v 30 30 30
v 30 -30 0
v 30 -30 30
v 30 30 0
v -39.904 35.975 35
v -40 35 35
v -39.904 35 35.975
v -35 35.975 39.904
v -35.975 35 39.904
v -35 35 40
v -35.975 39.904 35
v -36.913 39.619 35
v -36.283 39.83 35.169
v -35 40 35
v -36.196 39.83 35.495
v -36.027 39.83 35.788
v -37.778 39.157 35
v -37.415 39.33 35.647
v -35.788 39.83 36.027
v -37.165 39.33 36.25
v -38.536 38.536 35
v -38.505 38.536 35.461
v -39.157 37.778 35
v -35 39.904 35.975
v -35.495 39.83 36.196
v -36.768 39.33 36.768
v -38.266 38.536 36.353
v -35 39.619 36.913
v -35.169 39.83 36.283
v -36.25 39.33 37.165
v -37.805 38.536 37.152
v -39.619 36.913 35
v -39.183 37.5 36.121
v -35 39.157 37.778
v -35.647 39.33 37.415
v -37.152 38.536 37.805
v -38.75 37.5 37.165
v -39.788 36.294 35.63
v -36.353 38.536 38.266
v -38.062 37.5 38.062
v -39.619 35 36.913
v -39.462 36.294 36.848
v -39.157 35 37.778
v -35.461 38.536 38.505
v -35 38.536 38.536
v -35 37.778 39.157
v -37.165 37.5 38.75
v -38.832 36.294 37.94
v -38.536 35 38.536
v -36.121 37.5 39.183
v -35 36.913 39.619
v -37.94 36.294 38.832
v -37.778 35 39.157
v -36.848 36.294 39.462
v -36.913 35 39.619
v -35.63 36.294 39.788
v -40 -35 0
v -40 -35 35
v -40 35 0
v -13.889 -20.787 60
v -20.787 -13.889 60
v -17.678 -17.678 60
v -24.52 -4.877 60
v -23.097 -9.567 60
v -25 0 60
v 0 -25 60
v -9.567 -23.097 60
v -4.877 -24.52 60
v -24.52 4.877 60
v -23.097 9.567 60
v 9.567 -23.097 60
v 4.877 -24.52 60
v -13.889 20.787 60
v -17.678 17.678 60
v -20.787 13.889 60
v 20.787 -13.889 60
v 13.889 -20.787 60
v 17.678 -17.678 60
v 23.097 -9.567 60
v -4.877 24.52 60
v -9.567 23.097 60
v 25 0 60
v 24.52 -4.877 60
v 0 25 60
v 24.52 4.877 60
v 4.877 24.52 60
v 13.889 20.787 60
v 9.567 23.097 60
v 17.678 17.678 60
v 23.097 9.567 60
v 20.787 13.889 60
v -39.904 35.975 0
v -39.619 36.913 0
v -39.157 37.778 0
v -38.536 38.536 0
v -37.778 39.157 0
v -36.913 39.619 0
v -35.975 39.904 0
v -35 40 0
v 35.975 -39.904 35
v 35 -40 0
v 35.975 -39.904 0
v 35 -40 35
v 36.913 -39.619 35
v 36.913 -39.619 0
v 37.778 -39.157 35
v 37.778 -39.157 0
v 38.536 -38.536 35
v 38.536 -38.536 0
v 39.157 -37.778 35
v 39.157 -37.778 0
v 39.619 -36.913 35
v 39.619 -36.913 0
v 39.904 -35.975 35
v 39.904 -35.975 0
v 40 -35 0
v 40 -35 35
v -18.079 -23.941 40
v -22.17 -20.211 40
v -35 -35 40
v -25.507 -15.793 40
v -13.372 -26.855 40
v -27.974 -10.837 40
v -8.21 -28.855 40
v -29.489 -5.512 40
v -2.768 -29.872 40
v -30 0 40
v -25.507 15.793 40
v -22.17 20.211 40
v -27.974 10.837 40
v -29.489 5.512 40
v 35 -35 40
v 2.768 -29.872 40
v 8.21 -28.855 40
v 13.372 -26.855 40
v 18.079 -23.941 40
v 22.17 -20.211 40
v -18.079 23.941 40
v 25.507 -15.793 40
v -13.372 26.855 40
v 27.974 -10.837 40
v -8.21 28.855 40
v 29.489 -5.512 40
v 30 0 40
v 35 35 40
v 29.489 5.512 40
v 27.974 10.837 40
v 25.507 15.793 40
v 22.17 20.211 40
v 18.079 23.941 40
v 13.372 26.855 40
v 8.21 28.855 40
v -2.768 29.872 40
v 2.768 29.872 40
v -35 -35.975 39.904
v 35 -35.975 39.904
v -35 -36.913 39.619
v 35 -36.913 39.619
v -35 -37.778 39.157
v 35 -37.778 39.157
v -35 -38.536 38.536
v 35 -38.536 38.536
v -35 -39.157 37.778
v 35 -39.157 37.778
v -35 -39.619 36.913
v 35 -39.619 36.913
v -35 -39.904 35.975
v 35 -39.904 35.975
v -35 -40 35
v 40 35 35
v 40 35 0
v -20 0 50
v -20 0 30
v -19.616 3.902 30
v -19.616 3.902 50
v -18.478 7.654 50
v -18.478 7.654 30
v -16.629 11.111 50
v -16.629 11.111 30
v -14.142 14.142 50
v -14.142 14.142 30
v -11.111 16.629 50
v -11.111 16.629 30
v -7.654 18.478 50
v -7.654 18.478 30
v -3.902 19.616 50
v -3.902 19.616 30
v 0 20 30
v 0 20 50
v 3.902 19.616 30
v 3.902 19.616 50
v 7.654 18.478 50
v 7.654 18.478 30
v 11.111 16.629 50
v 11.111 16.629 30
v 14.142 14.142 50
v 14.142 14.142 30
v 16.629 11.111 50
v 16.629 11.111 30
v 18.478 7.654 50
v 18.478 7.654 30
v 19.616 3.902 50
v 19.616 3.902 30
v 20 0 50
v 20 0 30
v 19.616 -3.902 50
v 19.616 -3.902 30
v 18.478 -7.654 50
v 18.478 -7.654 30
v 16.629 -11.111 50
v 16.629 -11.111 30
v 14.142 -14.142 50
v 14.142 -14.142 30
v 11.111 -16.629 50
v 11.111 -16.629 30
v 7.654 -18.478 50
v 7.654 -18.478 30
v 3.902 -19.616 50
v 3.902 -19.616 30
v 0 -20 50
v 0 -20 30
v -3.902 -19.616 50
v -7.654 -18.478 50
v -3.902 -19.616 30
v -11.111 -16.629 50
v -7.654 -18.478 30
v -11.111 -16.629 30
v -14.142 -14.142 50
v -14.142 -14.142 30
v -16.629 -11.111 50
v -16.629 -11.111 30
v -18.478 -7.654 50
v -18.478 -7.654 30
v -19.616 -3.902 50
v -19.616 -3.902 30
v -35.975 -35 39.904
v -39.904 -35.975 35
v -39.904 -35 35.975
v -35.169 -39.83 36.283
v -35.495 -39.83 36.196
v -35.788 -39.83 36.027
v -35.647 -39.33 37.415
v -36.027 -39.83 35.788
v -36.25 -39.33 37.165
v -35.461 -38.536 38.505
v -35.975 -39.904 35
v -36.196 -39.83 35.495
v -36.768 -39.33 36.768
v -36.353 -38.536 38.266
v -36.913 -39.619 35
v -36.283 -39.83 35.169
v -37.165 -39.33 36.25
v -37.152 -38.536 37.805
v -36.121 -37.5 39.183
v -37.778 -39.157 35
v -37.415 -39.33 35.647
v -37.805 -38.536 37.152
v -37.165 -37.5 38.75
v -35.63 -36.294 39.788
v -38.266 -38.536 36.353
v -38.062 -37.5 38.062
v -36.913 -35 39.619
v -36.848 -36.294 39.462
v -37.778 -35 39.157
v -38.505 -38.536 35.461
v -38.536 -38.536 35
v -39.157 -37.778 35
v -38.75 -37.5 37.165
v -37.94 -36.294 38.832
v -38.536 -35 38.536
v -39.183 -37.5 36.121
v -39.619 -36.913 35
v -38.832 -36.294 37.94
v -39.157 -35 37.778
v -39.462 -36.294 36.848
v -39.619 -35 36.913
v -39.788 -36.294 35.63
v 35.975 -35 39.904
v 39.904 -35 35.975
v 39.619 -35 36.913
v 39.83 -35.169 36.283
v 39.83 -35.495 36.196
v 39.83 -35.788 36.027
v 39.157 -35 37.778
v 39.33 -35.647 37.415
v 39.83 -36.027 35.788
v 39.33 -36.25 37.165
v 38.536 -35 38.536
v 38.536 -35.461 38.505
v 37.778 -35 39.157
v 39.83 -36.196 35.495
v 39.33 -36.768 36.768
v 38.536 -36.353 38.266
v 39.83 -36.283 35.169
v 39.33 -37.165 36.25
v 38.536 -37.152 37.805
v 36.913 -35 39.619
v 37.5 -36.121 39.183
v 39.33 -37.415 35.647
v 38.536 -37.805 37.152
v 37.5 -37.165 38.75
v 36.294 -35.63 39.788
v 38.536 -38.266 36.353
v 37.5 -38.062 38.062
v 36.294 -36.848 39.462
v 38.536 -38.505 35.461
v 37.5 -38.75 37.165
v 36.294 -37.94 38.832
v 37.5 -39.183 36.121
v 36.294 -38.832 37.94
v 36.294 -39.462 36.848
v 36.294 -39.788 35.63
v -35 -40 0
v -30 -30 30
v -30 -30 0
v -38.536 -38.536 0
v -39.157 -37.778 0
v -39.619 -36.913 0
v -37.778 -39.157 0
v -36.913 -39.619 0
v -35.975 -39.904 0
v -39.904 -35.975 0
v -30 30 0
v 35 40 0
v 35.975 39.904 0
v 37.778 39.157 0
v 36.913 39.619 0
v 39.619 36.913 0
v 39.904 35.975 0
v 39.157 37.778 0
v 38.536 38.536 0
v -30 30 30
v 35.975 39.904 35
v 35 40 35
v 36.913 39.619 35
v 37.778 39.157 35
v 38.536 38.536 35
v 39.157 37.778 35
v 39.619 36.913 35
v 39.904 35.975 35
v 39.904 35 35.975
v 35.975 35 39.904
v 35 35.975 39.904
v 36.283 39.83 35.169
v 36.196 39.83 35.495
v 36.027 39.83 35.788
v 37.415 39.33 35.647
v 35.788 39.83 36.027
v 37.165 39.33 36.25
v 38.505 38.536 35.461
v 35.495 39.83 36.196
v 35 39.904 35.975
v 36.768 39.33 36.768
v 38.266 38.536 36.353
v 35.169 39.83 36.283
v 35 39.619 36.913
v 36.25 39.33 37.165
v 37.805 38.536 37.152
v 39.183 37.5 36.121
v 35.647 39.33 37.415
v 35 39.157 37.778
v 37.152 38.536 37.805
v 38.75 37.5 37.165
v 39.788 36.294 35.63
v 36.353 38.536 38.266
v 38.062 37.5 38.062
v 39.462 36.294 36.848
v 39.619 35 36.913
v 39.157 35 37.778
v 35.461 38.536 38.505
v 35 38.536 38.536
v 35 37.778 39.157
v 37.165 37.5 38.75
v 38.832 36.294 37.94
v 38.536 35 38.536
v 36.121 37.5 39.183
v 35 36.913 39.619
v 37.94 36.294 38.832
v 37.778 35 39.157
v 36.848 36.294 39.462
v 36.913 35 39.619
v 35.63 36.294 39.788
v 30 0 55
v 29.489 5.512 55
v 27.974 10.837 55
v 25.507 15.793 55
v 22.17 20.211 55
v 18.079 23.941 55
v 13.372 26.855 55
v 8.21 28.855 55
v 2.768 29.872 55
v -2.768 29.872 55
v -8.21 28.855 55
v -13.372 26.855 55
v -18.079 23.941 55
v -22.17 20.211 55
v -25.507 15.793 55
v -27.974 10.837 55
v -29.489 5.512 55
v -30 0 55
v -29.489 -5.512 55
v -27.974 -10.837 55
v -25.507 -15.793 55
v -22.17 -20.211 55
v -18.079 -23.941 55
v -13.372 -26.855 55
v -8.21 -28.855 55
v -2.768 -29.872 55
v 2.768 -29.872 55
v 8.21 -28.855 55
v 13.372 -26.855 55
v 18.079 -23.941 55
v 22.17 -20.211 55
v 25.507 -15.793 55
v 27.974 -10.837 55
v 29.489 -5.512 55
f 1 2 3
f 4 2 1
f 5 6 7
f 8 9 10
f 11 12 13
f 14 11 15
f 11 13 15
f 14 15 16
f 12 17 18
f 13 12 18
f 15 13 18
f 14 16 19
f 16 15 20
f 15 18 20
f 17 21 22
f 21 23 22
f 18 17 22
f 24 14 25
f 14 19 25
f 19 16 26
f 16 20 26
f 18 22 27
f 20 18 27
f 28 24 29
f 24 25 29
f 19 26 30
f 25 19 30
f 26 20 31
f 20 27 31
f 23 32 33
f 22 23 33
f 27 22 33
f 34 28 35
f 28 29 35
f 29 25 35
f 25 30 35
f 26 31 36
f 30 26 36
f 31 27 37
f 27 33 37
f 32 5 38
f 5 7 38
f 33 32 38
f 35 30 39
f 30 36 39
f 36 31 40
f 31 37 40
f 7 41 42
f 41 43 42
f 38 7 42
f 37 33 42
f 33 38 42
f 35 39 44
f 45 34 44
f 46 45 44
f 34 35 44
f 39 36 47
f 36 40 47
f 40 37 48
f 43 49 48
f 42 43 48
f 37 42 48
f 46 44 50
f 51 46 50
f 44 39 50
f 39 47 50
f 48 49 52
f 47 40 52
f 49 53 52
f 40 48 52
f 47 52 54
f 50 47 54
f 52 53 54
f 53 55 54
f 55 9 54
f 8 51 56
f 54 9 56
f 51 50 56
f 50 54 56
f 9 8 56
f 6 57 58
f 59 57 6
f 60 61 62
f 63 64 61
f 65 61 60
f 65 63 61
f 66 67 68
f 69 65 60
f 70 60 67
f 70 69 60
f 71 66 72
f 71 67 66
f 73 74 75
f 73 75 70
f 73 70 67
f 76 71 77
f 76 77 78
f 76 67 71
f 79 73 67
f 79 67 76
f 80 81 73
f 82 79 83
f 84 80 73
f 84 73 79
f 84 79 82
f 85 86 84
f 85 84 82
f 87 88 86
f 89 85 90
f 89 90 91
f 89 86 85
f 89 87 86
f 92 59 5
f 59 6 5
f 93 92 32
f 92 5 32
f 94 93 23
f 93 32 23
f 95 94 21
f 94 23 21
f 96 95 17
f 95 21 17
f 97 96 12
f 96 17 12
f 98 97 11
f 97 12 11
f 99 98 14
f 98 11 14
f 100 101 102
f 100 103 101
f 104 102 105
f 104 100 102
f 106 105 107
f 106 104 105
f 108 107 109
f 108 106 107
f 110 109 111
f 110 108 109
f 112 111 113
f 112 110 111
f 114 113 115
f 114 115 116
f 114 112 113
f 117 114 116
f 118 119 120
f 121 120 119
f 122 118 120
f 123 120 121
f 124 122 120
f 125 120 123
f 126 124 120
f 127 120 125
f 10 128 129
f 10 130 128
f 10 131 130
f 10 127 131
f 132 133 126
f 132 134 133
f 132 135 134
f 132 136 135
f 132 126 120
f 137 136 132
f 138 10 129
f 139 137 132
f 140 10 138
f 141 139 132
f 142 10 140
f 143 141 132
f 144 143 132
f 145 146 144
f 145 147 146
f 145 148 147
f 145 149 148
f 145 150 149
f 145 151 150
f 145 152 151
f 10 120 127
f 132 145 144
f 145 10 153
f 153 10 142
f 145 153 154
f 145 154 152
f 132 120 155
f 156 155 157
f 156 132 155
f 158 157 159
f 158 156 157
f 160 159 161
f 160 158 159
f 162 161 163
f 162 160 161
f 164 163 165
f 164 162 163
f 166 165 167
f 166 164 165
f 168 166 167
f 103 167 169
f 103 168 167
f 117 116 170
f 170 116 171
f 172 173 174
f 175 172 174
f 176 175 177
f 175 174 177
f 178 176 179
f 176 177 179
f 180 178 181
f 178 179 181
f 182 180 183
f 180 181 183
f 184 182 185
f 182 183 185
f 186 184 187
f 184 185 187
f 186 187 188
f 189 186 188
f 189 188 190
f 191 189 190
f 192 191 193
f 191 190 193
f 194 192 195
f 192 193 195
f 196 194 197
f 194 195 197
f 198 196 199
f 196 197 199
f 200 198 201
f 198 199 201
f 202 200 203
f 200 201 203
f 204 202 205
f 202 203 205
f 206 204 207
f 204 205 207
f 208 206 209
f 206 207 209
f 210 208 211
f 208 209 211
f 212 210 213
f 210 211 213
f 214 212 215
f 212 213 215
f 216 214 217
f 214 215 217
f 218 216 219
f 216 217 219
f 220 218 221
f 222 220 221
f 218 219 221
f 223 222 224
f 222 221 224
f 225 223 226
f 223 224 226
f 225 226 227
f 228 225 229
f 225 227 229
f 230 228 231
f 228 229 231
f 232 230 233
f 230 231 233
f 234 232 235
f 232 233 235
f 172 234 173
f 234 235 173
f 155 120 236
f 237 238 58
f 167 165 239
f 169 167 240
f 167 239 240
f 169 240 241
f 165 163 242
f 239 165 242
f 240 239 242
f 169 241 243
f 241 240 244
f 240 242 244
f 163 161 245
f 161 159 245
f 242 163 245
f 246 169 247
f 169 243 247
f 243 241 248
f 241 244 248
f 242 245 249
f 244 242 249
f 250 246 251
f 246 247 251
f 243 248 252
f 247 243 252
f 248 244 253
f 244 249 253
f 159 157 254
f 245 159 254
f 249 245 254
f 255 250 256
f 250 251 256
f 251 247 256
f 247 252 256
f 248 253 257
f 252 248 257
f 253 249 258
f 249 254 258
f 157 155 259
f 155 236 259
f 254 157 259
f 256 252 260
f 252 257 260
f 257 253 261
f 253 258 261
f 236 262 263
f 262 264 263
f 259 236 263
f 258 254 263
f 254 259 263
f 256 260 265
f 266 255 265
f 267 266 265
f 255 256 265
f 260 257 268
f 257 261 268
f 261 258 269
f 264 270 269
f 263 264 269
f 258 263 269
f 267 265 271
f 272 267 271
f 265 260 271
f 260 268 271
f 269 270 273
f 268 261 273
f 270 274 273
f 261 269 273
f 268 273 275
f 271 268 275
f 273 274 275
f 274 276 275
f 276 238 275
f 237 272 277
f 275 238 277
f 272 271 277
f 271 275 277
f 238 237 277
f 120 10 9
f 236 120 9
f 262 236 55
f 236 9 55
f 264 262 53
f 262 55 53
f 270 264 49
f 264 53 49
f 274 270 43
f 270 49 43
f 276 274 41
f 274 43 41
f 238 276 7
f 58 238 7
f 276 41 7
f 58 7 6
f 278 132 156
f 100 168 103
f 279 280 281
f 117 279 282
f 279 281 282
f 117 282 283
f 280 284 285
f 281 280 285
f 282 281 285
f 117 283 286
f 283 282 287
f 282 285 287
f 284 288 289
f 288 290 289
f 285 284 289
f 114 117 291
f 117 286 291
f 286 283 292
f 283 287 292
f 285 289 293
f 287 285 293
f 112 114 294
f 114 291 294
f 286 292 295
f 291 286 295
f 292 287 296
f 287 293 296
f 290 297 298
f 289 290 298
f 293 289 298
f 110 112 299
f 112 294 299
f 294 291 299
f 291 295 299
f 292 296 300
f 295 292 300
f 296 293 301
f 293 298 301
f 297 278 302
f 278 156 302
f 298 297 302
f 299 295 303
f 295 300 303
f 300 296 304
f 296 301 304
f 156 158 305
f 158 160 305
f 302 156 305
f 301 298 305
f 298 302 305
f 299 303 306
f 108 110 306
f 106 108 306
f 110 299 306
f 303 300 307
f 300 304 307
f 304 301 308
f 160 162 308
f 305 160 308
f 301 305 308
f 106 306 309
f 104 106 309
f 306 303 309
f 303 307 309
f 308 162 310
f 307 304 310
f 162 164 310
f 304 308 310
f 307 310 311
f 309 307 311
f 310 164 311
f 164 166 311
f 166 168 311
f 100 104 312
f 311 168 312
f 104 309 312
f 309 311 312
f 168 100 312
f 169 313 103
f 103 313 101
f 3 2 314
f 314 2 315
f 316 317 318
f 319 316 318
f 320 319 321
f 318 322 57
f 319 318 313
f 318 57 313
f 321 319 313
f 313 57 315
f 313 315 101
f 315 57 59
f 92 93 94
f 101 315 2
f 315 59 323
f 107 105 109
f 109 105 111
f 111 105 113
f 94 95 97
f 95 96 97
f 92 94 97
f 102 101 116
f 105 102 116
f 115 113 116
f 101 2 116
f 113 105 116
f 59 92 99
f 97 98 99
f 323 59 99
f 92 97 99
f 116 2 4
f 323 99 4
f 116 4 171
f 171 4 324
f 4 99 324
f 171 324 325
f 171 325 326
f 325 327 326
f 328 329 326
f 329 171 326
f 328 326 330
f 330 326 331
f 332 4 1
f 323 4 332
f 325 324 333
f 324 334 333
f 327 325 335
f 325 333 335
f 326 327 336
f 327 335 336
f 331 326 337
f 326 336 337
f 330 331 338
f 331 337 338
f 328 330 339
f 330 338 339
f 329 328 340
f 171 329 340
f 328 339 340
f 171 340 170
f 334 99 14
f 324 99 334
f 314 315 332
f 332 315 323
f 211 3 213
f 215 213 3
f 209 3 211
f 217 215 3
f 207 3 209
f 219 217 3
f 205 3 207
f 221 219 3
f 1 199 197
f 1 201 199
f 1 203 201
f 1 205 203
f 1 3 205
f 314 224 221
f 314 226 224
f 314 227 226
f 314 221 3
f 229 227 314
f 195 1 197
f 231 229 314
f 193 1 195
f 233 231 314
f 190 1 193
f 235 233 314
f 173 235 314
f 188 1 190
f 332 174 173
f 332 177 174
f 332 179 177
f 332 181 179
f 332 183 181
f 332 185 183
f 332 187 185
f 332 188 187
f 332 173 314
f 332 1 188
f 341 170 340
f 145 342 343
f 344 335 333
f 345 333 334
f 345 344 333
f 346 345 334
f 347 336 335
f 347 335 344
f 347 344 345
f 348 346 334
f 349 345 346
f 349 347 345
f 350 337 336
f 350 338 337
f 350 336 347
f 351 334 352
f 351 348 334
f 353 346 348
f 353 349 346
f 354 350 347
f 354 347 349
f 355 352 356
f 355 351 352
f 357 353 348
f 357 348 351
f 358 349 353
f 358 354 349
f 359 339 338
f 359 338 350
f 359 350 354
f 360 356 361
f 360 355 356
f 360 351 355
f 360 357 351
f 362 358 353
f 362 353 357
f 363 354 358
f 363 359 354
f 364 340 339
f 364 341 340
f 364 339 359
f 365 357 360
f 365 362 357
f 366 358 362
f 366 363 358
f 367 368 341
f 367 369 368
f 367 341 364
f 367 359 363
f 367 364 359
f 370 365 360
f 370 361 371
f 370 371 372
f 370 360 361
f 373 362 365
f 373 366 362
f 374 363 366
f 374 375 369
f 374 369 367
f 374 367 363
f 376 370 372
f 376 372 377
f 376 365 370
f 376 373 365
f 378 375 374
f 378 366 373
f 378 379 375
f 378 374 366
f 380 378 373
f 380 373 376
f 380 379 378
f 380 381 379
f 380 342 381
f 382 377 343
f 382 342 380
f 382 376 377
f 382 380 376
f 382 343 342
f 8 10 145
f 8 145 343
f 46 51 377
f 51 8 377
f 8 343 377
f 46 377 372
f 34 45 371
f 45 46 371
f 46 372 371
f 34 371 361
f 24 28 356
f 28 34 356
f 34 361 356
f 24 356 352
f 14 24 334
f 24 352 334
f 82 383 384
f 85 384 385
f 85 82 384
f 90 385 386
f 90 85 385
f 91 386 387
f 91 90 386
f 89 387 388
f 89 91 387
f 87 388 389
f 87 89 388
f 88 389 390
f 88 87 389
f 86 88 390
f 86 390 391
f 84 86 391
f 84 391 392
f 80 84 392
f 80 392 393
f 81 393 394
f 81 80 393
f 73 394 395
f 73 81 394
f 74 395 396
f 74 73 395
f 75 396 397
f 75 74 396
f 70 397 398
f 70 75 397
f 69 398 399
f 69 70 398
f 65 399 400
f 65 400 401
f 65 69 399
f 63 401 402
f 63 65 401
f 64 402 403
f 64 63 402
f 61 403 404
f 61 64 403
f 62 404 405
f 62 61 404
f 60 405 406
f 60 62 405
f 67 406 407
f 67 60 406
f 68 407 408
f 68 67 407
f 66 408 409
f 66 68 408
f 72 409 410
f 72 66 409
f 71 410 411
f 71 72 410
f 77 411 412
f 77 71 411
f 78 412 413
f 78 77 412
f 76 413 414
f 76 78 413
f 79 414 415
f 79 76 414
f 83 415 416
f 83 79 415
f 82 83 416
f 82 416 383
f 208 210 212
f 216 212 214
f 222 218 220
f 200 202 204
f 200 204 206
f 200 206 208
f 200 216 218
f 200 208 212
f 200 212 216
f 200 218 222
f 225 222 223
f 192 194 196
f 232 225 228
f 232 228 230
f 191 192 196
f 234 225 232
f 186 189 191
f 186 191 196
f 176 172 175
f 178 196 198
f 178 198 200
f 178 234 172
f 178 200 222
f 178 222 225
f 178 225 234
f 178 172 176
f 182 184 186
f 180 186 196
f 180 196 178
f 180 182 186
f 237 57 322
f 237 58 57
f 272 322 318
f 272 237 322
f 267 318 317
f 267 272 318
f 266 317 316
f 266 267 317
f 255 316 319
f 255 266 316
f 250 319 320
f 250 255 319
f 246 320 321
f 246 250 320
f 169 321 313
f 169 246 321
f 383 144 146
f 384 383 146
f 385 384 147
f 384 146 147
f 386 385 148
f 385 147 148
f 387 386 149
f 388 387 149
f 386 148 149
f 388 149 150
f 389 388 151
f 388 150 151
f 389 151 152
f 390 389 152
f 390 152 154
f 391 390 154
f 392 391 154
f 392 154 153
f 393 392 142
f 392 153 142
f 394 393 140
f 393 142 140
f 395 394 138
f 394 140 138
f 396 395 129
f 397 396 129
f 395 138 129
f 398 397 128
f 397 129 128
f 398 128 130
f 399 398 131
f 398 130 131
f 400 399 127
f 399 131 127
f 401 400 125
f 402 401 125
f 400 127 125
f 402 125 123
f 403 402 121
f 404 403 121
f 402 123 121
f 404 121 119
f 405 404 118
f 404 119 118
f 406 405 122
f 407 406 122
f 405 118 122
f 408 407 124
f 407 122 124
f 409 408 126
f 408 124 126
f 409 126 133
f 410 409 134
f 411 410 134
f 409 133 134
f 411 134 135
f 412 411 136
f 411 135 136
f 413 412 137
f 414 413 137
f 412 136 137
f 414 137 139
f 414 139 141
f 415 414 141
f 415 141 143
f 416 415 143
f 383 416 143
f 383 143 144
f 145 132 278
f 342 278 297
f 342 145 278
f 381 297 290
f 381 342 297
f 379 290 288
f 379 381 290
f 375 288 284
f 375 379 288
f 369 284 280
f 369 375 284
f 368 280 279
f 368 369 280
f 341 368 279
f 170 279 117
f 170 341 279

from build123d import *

# Parameters (mm, degrees)
SKETCH_1_W          = 80
SKETCH_1_H          = 80
EXTRUDE_1_DEPTH     = 40
SKETCH_2_R          = 30
EXTRUDE_2_DEPTH     = 20
SKETCH_3_W          = 60
SKETCH_3_H          = 60
CUT_EXTRUDE_1_DEPTH = 30
SKETCH_4_R          = 20
CUT_EXTRUDE_2_DEPTH = 20
CHAMFER_1_SIZE      = 5
FILLET_1_R          = 5


with BuildPart() as part:
    # 草图1 → 凸台-拉伸1 (new body)
    with BuildSketch(Plane.XY):
        Rectangle(SKETCH_1_W, SKETCH_1_H)
    extrude(amount=EXTRUDE_1_DEPTH)

    # 草图2 → 凸台-拉伸2 (add)
    with BuildSketch(Plane.XY.offset(40)):
        Circle(SKETCH_2_R)
    extrude(amount=EXTRUDE_2_DEPTH)

    # 草图3 → 切除-拉伸1 (cut)
    with BuildSketch(Plane(origin=(0, 0, 0), x_dir=(-1, 0, 0), z_dir=(0, 0, -1))):
        Rectangle(SKETCH_3_W, SKETCH_3_H)
    extrude(amount=-CUT_EXTRUDE_1_DEPTH, mode=Mode.SUBTRACT)

    # 草图4 → 切除-拉伸2 (cut)
    with BuildSketch(Plane(origin=(0, 0, 30), x_dir=(-1, 0, 0), z_dir=(0, 0, -1))):
        Circle(SKETCH_4_R)
    extrude(amount=-CUT_EXTRUDE_2_DEPTH, mode=Mode.SUBTRACT)

    # 倒角1
    chamfer_1_edges = [part.edges().sort_by_distance(p)[0] for p in [
        (-30, 0, 60),
    ]]
    chamfer(chamfer_1_edges, length=CHAMFER_1_SIZE)

    # 圆角1
    fillet_1_edges = [part.edges().sort_by_distance(p)[0] for p in [
        (-40, 0, 40),
        (0, -40, 40),
        (40, 0, 40),
        (40, -40, 20),
        (-40, -40, 20),
        (-40, 40, 20),
        (40, 40, 20),
        (0, 40, 40),
    ]]
    fillet(fillet_1_edges, radius=FILLET_1_R)


solid = part.part
